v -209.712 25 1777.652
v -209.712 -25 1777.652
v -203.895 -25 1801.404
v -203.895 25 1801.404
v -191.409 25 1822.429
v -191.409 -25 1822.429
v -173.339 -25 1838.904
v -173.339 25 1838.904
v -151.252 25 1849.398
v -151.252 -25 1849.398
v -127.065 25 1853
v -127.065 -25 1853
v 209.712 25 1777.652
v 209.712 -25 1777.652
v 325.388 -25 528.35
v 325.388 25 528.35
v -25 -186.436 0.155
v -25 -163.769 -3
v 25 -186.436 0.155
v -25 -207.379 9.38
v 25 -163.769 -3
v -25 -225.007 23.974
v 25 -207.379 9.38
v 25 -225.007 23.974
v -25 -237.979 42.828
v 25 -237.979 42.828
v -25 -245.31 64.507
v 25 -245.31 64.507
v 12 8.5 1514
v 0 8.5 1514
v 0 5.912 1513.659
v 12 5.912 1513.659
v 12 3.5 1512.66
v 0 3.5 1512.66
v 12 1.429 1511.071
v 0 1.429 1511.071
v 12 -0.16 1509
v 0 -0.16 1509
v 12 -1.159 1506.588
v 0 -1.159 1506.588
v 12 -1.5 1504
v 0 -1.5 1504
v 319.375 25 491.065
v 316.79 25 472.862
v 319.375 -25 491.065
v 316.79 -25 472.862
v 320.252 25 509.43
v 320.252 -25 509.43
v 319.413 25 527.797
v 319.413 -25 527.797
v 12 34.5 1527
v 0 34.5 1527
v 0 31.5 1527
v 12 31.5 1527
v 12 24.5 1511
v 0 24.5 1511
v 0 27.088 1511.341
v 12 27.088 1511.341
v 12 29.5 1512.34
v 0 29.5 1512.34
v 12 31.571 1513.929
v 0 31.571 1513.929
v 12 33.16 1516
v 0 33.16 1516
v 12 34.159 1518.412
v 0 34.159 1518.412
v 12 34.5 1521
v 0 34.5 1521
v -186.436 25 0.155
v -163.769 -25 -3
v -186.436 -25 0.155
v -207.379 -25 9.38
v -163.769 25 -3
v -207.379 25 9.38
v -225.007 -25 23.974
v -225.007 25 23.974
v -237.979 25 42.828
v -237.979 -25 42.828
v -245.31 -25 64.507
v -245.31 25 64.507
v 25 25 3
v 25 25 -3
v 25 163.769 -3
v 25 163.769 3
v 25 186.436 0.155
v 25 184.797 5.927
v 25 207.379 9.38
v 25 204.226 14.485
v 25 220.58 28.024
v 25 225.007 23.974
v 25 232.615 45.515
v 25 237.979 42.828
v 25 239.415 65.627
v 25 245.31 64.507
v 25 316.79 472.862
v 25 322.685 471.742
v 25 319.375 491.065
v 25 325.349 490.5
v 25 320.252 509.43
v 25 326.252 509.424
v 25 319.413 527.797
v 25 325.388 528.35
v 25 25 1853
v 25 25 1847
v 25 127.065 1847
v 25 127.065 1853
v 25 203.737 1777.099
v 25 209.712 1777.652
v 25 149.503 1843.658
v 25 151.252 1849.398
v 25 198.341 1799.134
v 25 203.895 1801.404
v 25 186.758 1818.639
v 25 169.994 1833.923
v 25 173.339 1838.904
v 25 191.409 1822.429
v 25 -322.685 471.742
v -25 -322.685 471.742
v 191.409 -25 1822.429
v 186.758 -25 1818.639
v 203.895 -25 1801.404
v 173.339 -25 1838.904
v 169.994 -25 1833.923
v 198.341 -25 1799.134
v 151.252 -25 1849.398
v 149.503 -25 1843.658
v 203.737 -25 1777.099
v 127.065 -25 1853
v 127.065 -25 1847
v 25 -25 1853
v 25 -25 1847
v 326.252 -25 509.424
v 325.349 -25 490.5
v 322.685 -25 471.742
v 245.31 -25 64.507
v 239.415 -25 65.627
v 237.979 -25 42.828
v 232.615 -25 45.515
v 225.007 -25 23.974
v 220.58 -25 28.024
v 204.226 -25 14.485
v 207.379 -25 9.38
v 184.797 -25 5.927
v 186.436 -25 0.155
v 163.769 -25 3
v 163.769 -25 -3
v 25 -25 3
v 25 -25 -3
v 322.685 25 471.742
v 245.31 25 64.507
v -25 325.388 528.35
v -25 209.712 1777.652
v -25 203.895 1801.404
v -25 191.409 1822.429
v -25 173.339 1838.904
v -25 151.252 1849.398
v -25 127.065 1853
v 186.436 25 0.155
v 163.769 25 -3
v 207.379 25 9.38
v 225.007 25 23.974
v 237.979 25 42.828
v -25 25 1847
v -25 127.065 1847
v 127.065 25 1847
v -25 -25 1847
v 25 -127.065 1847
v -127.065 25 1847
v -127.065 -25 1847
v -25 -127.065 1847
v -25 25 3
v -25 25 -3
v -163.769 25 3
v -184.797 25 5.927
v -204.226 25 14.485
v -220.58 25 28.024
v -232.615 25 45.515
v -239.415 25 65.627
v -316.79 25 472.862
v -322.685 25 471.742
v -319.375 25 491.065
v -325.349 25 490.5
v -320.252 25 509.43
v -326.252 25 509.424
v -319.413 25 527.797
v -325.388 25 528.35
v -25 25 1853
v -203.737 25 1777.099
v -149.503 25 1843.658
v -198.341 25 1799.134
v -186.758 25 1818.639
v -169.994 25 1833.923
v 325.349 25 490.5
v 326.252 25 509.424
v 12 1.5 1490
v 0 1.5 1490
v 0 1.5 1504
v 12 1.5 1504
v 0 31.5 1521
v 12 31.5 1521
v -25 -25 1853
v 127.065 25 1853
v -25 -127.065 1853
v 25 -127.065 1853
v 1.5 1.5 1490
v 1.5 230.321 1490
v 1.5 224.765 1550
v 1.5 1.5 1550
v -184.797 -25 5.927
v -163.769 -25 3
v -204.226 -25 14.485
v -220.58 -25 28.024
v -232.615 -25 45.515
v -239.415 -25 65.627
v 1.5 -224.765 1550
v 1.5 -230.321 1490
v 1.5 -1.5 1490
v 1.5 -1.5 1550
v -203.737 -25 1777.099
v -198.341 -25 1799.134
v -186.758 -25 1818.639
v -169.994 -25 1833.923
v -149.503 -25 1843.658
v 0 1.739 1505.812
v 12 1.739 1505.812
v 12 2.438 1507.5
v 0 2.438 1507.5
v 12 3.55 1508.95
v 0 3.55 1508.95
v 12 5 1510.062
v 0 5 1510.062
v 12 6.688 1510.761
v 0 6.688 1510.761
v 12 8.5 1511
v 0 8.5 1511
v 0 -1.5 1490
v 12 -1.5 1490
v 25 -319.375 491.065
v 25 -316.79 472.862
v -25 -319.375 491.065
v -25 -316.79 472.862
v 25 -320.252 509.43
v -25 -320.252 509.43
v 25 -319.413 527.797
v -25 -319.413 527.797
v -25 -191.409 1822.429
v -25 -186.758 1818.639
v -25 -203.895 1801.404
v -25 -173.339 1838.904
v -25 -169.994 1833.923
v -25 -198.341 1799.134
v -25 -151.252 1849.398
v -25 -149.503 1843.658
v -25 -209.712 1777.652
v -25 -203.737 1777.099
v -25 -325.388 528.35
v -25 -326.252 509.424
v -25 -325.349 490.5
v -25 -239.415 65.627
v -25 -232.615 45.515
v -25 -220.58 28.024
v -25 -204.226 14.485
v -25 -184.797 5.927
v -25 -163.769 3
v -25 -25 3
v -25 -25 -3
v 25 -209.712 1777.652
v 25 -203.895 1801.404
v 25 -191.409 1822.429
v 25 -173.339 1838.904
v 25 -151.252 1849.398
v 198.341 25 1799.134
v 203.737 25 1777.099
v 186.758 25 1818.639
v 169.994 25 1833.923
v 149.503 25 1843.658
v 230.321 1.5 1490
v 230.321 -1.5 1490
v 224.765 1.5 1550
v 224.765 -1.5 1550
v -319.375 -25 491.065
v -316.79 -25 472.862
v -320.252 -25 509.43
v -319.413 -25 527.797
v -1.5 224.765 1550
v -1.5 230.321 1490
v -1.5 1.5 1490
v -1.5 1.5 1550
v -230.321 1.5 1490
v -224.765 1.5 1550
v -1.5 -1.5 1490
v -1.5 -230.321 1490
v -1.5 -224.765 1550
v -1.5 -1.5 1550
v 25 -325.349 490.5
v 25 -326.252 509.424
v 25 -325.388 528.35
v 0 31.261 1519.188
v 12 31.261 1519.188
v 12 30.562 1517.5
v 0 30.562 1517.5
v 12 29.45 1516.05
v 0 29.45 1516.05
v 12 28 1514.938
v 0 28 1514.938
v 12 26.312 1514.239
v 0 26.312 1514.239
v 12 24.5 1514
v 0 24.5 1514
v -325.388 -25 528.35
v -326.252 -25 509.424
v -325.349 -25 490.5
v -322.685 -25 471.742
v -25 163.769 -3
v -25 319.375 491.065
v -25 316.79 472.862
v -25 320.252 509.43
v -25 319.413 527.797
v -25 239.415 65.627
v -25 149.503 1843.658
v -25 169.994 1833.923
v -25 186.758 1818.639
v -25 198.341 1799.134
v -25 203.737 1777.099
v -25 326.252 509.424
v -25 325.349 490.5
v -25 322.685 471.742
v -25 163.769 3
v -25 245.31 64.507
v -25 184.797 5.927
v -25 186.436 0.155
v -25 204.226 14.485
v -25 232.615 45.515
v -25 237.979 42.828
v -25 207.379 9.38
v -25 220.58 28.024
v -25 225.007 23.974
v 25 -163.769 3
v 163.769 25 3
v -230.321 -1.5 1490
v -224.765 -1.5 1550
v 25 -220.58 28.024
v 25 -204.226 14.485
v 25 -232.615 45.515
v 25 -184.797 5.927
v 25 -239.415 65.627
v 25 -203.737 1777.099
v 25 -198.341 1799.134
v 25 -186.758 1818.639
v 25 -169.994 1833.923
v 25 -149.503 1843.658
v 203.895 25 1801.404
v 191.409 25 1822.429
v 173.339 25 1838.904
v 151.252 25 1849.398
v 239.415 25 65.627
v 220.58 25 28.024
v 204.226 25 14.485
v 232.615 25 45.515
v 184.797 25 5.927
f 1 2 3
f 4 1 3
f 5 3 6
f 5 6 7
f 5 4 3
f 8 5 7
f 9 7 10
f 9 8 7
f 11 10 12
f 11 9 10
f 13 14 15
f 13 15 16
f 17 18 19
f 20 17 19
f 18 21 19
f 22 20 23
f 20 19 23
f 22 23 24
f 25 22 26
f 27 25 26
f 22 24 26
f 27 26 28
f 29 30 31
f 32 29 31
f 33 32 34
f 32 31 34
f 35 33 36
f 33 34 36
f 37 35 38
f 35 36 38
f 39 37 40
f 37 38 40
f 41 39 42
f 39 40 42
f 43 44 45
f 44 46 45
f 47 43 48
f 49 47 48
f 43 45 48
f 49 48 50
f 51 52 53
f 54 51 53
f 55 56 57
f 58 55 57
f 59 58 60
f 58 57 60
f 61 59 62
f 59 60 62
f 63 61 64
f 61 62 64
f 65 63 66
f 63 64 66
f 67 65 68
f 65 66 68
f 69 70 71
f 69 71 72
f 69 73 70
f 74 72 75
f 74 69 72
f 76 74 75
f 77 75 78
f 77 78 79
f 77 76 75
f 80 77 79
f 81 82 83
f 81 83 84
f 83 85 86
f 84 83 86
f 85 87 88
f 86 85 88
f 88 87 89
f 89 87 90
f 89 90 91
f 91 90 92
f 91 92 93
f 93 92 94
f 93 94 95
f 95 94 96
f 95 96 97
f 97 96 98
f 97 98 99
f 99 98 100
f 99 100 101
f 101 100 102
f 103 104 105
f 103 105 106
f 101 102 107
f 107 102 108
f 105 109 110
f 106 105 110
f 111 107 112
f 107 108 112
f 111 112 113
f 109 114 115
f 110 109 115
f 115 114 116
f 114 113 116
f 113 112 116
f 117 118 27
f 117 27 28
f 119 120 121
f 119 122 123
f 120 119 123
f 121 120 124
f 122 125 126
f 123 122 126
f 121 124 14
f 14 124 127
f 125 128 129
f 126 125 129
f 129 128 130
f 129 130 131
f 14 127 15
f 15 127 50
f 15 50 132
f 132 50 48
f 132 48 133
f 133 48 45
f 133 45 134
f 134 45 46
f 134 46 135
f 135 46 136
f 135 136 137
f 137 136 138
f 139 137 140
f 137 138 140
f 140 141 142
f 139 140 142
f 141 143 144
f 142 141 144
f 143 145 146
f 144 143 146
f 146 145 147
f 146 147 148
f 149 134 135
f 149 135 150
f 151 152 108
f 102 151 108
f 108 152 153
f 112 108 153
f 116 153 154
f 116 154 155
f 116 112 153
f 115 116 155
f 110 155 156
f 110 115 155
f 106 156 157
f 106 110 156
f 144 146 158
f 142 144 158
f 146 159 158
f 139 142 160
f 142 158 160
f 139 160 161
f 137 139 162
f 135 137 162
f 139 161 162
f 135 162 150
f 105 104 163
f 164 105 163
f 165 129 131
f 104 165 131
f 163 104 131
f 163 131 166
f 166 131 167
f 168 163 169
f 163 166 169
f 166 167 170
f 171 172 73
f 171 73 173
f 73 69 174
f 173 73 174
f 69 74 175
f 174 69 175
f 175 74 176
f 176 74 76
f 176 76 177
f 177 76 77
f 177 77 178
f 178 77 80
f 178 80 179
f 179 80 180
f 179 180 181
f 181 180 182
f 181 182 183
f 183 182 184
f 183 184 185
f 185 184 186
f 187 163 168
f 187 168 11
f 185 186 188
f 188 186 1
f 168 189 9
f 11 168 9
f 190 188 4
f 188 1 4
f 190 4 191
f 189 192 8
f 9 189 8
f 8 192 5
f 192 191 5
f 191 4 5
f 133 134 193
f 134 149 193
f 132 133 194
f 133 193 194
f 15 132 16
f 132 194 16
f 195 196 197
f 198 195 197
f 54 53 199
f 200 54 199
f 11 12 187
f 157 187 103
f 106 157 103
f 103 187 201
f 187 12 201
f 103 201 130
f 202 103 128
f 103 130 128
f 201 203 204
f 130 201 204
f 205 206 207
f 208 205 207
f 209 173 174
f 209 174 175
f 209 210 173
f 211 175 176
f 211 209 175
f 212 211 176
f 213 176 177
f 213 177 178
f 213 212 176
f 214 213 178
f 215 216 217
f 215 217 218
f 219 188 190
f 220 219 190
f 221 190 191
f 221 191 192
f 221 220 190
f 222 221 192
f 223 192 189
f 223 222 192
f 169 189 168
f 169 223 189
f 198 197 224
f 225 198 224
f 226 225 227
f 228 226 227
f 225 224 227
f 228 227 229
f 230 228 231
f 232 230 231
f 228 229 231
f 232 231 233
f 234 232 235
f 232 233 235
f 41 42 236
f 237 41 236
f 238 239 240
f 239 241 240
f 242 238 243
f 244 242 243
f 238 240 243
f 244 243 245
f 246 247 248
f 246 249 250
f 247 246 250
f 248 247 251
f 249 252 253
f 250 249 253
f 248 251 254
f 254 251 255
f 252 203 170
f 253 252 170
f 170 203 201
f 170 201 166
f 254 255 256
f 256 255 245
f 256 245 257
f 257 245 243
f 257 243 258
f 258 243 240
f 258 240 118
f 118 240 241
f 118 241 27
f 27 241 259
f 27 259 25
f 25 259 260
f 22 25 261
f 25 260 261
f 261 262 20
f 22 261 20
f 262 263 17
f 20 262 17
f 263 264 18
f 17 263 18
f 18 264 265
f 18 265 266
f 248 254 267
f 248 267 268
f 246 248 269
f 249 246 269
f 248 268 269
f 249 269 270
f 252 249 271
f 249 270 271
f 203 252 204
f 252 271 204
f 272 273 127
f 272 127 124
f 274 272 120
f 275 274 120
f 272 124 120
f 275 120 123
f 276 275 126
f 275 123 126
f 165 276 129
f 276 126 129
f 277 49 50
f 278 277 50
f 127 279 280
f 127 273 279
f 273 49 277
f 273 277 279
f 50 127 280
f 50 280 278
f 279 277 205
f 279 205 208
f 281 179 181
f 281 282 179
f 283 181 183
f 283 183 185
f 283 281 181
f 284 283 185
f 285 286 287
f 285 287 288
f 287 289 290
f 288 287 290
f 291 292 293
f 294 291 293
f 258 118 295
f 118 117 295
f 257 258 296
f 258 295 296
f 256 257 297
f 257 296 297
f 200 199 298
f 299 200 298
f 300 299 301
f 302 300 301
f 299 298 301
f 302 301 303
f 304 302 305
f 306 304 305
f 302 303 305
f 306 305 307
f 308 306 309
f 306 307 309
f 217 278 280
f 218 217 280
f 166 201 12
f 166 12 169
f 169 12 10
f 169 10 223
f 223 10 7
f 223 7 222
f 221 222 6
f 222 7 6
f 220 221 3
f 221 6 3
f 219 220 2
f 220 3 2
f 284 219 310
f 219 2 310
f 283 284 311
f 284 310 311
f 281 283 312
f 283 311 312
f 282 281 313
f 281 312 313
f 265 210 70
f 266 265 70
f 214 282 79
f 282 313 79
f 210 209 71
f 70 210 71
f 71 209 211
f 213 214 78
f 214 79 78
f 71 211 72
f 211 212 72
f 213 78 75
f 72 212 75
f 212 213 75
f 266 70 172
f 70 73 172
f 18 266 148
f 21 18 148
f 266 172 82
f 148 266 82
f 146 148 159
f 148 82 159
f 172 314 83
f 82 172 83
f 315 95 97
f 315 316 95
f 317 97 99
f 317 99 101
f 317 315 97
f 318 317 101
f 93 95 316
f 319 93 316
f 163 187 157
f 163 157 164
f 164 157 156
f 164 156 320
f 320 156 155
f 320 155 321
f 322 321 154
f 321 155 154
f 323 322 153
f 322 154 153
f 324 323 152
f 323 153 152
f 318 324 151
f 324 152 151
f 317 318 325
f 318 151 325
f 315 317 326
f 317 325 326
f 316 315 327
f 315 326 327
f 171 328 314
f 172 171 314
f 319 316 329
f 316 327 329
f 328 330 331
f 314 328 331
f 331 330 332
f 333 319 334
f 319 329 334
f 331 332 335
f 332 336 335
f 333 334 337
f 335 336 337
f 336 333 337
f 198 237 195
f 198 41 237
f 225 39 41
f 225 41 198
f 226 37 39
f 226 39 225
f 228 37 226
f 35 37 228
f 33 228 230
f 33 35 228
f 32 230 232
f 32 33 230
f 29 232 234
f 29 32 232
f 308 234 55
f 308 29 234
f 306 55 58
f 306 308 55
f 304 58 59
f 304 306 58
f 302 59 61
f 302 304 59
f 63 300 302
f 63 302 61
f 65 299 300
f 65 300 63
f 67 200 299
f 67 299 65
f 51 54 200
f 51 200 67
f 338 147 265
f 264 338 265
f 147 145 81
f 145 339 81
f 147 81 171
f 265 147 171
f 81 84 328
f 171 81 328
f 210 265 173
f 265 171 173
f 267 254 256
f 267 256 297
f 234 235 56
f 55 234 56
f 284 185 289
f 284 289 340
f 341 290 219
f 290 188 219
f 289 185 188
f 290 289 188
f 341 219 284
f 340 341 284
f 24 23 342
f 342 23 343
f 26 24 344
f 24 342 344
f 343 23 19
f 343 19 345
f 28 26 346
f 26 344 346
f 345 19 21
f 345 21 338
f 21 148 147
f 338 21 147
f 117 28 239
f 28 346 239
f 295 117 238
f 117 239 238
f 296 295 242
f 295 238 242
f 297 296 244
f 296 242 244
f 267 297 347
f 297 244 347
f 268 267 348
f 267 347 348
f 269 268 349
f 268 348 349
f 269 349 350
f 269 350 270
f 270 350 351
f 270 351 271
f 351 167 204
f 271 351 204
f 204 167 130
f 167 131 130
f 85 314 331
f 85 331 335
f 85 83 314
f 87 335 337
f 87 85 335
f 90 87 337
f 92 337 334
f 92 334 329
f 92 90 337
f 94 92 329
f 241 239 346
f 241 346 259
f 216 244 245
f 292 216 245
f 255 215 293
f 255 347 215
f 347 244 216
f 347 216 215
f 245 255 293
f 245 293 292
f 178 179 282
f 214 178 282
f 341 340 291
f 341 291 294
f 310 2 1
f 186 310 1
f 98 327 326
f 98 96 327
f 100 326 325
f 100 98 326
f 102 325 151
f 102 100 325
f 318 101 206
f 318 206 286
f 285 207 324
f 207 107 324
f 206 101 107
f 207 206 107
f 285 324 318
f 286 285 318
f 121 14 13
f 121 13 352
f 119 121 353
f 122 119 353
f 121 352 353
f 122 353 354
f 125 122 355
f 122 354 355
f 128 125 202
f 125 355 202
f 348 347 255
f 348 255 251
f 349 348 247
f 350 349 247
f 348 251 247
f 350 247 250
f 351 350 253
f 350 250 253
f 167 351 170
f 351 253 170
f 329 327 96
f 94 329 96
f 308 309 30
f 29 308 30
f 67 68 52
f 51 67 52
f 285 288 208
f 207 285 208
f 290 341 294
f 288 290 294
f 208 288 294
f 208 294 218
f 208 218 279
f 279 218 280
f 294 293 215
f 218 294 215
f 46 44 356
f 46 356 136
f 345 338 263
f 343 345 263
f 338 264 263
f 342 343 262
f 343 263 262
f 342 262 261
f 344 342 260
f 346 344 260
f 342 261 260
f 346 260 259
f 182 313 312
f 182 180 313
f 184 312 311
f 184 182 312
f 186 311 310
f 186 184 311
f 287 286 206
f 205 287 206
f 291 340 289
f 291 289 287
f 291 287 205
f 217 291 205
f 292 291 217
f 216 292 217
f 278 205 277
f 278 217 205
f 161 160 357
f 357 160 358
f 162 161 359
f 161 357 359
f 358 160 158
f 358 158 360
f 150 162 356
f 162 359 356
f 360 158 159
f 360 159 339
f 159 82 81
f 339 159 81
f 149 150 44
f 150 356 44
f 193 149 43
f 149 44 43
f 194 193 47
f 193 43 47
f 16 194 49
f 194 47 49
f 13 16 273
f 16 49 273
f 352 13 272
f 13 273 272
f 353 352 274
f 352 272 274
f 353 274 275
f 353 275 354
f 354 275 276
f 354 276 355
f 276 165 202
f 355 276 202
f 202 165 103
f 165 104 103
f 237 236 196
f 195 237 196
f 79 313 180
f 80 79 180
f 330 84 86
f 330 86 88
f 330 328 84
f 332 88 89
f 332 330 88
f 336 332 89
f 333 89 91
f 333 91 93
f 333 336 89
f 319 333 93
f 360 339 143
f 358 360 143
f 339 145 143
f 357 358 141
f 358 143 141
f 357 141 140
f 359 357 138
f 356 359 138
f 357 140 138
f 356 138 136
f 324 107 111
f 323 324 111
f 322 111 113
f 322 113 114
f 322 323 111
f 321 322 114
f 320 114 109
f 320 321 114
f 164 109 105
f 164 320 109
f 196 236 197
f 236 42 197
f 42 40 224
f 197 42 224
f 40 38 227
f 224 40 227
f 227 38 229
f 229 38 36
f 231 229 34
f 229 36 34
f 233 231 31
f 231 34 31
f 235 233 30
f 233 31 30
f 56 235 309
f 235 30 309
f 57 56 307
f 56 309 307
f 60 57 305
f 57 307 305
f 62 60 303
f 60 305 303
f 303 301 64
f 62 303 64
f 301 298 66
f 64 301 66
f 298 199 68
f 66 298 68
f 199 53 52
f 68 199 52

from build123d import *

# Parameters (mm, degrees)
F2_W          = 50
F2_H          = 6
F6_DEPTH      = 12
F4_W          = 3
F4_H          = 60
F8_DEPTH      = 230.3205006971
F8_DEPTH_BACK = 230.3205006971
F9_COUNT      = 3
F9_ANGLE      = 180


with BuildPart() as f3:
    # F3: sweep along a path in F1
    with BuildLine(Plane.XZ) as f3_path:
        Line((0, 0), (163.7688020474, 0))
        ThreePointArc((163.7688020474, 0), (214.7853281283, 18.3776496177), (242.3627581835, 65.0671483341))
        Line((242.3627581835, 65.0671483341), (319.737347904, 472.3018310739))
        ThreePointArc((319.737347904, 472.3018310739), (323.0248161759, 500.0943200705), (322.4005923749, 528.0736023507))
        Line((322.4005923749, 528.0736023507), (206.7244576996, 1777.3758568449))
        ThreePointArc((206.7244576996, 1777.3758568449), (180.9629377368, 1829.1188148883), (127.0652037751, 1850))
        Line((127.0652037751, 1850), (0, 1850))
    # F2 (on Right) → F3 (sweep)
    with BuildSketch(Plane.YZ):
        Rectangle(F2_W, F2_H)
    sweep(path=f3_path.line)

    # F7: F3 across plane


with BuildPart() as f6:
    # F5 (on Right) → F6 (new body)
    with BuildSketch(Plane.YZ):
        with BuildLine():
            Line((-1.5, 1490), (1.5, 1490))
            Line((1.5, 1490), (1.5, 1504))
            ThreePointArc((1.5, 1504), (3.5502525317, 1508.9497474683), (8.5, 1511))
            Line((8.5, 1511), (24.5, 1511))
            ThreePointArc((24.5, 1511), (31.5710678119, 1513.9289321881), (34.5, 1521))
            Line((34.5, 1521), (34.5, 1527))
            Line((34.5, 1527), (31.5, 1527))
            Line((31.5, 1527), (31.5, 1521))
            ThreePointArc((31.5, 1521), (29.4497474683, 1516.0502525317), (24.5, 1514))
            Line((24.5, 1514), (8.5, 1514))
            ThreePointArc((8.5, 1514), (1.4289321881, 1511.0710678119), (-1.5, 1504))
            Line((-1.5, 1504), (-1.5, 1490))
        make_face()
    extrude(amount=F6_DEPTH)


with BuildPart() as f3_1:
    add(f3.part)
    add(f3.part.mirror(Plane.YZ))

    # F4 (on Right) → F8 (join, two sides)
    with BuildSketch(Plane.YZ) as f8_sk:
        with Locations((0, 1520)):
            Rectangle(F4_W, F4_H)
    extrude(amount=F8_DEPTH)
    extrude(f8_sk.sketch, amount=-F8_DEPTH_BACK)

    # F9: F3 ×3 about axis
    f9_axis = Axis((0, 0, 925), (0, 0, -1))


with BuildPart() as f3_2:
    add(f3_1.part)
    for i in range(1, F9_COUNT):
        add(f3_1.part.rotate(f9_axis, i * F9_ANGLE / (F9_COUNT - 1)))


solid = Compound([f6.part, f3_2.part])
